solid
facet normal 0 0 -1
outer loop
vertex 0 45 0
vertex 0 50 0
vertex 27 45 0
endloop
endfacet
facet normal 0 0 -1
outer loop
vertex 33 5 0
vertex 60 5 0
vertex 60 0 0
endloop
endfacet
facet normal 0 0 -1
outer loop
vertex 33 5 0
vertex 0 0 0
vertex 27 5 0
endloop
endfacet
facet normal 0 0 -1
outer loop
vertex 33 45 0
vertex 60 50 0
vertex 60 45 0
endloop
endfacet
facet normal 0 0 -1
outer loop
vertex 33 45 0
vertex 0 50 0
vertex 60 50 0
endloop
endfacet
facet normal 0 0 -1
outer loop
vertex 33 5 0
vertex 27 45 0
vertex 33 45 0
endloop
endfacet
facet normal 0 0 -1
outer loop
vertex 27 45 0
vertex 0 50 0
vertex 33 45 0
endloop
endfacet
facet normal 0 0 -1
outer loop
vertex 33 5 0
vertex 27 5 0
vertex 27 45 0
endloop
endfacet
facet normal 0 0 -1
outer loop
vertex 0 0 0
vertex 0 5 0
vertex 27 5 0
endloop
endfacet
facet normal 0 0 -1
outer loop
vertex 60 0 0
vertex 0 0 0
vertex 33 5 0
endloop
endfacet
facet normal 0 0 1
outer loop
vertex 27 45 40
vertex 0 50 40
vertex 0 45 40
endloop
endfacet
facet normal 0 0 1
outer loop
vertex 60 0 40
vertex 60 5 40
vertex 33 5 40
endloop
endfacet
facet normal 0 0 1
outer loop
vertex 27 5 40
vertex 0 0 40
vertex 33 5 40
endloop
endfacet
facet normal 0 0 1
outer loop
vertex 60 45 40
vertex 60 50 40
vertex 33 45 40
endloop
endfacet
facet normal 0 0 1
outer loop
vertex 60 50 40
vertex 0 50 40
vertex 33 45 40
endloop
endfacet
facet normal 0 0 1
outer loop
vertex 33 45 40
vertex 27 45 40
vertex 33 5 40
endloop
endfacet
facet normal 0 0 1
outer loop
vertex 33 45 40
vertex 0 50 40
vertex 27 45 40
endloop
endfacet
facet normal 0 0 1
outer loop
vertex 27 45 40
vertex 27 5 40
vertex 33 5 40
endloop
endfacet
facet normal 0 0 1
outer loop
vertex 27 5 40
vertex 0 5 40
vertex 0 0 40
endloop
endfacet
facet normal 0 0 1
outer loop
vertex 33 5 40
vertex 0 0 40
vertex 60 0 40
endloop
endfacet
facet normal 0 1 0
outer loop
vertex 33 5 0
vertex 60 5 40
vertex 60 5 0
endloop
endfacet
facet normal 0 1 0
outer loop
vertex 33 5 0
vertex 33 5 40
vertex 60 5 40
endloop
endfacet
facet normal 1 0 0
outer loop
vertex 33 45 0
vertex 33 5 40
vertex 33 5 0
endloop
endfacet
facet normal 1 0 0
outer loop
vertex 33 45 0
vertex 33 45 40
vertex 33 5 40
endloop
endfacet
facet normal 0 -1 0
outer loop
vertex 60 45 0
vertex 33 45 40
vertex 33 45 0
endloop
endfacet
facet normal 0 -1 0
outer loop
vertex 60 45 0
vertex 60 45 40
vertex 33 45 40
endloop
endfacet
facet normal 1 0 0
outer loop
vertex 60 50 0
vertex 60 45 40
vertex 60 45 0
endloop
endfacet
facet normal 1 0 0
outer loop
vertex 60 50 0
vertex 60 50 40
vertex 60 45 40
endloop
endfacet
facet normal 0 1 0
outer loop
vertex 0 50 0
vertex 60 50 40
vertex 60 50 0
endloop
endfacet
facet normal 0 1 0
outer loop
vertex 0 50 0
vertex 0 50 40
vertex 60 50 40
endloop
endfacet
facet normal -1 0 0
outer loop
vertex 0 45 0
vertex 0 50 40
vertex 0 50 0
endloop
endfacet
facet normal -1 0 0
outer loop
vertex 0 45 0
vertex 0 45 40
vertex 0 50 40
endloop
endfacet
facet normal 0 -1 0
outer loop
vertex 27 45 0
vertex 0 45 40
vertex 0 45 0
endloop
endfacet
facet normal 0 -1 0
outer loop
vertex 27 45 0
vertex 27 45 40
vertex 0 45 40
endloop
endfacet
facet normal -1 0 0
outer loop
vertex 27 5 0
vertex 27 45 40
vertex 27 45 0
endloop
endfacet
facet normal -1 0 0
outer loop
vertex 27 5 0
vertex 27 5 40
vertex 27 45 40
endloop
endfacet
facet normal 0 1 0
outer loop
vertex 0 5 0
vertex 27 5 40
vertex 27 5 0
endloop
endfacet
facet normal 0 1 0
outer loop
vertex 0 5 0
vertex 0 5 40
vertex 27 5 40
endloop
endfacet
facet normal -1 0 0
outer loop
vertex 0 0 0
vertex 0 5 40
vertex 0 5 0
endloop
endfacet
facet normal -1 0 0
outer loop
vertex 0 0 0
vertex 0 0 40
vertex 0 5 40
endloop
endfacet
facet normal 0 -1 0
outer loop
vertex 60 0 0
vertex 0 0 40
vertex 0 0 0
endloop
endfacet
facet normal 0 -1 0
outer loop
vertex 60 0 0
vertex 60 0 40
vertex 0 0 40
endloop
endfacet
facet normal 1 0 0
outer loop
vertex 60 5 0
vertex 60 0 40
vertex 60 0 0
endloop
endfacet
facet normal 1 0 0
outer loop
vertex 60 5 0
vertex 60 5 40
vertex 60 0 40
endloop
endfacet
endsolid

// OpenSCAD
$fn = 32;

// ----------------------------------------------------------------------
// Structural section: ibeam 60 x 50 mm
// ----------------------------------------------------------------------

// --- parameters (mm) ---
sec_w = 60;               // section width, X
sec_h = 50;               // section height, Y
flange_t = 5;             // flange thickness
web_t = 6;                // web thickness
plate_t = 40;             // cut length, Z (extrusion height)

profile = [[0, 0], [60, 0], [60, 5], [33, 5], [33, 45], [60, 45], [60, 50], [0, 50], [0, 45], [27, 45], [27, 5], [0, 5]];  // primary outline, 12 points, counter clockwise

// --- the one profile operation ---
linear_extrude(height = plate_t) polygon(points = profile);
